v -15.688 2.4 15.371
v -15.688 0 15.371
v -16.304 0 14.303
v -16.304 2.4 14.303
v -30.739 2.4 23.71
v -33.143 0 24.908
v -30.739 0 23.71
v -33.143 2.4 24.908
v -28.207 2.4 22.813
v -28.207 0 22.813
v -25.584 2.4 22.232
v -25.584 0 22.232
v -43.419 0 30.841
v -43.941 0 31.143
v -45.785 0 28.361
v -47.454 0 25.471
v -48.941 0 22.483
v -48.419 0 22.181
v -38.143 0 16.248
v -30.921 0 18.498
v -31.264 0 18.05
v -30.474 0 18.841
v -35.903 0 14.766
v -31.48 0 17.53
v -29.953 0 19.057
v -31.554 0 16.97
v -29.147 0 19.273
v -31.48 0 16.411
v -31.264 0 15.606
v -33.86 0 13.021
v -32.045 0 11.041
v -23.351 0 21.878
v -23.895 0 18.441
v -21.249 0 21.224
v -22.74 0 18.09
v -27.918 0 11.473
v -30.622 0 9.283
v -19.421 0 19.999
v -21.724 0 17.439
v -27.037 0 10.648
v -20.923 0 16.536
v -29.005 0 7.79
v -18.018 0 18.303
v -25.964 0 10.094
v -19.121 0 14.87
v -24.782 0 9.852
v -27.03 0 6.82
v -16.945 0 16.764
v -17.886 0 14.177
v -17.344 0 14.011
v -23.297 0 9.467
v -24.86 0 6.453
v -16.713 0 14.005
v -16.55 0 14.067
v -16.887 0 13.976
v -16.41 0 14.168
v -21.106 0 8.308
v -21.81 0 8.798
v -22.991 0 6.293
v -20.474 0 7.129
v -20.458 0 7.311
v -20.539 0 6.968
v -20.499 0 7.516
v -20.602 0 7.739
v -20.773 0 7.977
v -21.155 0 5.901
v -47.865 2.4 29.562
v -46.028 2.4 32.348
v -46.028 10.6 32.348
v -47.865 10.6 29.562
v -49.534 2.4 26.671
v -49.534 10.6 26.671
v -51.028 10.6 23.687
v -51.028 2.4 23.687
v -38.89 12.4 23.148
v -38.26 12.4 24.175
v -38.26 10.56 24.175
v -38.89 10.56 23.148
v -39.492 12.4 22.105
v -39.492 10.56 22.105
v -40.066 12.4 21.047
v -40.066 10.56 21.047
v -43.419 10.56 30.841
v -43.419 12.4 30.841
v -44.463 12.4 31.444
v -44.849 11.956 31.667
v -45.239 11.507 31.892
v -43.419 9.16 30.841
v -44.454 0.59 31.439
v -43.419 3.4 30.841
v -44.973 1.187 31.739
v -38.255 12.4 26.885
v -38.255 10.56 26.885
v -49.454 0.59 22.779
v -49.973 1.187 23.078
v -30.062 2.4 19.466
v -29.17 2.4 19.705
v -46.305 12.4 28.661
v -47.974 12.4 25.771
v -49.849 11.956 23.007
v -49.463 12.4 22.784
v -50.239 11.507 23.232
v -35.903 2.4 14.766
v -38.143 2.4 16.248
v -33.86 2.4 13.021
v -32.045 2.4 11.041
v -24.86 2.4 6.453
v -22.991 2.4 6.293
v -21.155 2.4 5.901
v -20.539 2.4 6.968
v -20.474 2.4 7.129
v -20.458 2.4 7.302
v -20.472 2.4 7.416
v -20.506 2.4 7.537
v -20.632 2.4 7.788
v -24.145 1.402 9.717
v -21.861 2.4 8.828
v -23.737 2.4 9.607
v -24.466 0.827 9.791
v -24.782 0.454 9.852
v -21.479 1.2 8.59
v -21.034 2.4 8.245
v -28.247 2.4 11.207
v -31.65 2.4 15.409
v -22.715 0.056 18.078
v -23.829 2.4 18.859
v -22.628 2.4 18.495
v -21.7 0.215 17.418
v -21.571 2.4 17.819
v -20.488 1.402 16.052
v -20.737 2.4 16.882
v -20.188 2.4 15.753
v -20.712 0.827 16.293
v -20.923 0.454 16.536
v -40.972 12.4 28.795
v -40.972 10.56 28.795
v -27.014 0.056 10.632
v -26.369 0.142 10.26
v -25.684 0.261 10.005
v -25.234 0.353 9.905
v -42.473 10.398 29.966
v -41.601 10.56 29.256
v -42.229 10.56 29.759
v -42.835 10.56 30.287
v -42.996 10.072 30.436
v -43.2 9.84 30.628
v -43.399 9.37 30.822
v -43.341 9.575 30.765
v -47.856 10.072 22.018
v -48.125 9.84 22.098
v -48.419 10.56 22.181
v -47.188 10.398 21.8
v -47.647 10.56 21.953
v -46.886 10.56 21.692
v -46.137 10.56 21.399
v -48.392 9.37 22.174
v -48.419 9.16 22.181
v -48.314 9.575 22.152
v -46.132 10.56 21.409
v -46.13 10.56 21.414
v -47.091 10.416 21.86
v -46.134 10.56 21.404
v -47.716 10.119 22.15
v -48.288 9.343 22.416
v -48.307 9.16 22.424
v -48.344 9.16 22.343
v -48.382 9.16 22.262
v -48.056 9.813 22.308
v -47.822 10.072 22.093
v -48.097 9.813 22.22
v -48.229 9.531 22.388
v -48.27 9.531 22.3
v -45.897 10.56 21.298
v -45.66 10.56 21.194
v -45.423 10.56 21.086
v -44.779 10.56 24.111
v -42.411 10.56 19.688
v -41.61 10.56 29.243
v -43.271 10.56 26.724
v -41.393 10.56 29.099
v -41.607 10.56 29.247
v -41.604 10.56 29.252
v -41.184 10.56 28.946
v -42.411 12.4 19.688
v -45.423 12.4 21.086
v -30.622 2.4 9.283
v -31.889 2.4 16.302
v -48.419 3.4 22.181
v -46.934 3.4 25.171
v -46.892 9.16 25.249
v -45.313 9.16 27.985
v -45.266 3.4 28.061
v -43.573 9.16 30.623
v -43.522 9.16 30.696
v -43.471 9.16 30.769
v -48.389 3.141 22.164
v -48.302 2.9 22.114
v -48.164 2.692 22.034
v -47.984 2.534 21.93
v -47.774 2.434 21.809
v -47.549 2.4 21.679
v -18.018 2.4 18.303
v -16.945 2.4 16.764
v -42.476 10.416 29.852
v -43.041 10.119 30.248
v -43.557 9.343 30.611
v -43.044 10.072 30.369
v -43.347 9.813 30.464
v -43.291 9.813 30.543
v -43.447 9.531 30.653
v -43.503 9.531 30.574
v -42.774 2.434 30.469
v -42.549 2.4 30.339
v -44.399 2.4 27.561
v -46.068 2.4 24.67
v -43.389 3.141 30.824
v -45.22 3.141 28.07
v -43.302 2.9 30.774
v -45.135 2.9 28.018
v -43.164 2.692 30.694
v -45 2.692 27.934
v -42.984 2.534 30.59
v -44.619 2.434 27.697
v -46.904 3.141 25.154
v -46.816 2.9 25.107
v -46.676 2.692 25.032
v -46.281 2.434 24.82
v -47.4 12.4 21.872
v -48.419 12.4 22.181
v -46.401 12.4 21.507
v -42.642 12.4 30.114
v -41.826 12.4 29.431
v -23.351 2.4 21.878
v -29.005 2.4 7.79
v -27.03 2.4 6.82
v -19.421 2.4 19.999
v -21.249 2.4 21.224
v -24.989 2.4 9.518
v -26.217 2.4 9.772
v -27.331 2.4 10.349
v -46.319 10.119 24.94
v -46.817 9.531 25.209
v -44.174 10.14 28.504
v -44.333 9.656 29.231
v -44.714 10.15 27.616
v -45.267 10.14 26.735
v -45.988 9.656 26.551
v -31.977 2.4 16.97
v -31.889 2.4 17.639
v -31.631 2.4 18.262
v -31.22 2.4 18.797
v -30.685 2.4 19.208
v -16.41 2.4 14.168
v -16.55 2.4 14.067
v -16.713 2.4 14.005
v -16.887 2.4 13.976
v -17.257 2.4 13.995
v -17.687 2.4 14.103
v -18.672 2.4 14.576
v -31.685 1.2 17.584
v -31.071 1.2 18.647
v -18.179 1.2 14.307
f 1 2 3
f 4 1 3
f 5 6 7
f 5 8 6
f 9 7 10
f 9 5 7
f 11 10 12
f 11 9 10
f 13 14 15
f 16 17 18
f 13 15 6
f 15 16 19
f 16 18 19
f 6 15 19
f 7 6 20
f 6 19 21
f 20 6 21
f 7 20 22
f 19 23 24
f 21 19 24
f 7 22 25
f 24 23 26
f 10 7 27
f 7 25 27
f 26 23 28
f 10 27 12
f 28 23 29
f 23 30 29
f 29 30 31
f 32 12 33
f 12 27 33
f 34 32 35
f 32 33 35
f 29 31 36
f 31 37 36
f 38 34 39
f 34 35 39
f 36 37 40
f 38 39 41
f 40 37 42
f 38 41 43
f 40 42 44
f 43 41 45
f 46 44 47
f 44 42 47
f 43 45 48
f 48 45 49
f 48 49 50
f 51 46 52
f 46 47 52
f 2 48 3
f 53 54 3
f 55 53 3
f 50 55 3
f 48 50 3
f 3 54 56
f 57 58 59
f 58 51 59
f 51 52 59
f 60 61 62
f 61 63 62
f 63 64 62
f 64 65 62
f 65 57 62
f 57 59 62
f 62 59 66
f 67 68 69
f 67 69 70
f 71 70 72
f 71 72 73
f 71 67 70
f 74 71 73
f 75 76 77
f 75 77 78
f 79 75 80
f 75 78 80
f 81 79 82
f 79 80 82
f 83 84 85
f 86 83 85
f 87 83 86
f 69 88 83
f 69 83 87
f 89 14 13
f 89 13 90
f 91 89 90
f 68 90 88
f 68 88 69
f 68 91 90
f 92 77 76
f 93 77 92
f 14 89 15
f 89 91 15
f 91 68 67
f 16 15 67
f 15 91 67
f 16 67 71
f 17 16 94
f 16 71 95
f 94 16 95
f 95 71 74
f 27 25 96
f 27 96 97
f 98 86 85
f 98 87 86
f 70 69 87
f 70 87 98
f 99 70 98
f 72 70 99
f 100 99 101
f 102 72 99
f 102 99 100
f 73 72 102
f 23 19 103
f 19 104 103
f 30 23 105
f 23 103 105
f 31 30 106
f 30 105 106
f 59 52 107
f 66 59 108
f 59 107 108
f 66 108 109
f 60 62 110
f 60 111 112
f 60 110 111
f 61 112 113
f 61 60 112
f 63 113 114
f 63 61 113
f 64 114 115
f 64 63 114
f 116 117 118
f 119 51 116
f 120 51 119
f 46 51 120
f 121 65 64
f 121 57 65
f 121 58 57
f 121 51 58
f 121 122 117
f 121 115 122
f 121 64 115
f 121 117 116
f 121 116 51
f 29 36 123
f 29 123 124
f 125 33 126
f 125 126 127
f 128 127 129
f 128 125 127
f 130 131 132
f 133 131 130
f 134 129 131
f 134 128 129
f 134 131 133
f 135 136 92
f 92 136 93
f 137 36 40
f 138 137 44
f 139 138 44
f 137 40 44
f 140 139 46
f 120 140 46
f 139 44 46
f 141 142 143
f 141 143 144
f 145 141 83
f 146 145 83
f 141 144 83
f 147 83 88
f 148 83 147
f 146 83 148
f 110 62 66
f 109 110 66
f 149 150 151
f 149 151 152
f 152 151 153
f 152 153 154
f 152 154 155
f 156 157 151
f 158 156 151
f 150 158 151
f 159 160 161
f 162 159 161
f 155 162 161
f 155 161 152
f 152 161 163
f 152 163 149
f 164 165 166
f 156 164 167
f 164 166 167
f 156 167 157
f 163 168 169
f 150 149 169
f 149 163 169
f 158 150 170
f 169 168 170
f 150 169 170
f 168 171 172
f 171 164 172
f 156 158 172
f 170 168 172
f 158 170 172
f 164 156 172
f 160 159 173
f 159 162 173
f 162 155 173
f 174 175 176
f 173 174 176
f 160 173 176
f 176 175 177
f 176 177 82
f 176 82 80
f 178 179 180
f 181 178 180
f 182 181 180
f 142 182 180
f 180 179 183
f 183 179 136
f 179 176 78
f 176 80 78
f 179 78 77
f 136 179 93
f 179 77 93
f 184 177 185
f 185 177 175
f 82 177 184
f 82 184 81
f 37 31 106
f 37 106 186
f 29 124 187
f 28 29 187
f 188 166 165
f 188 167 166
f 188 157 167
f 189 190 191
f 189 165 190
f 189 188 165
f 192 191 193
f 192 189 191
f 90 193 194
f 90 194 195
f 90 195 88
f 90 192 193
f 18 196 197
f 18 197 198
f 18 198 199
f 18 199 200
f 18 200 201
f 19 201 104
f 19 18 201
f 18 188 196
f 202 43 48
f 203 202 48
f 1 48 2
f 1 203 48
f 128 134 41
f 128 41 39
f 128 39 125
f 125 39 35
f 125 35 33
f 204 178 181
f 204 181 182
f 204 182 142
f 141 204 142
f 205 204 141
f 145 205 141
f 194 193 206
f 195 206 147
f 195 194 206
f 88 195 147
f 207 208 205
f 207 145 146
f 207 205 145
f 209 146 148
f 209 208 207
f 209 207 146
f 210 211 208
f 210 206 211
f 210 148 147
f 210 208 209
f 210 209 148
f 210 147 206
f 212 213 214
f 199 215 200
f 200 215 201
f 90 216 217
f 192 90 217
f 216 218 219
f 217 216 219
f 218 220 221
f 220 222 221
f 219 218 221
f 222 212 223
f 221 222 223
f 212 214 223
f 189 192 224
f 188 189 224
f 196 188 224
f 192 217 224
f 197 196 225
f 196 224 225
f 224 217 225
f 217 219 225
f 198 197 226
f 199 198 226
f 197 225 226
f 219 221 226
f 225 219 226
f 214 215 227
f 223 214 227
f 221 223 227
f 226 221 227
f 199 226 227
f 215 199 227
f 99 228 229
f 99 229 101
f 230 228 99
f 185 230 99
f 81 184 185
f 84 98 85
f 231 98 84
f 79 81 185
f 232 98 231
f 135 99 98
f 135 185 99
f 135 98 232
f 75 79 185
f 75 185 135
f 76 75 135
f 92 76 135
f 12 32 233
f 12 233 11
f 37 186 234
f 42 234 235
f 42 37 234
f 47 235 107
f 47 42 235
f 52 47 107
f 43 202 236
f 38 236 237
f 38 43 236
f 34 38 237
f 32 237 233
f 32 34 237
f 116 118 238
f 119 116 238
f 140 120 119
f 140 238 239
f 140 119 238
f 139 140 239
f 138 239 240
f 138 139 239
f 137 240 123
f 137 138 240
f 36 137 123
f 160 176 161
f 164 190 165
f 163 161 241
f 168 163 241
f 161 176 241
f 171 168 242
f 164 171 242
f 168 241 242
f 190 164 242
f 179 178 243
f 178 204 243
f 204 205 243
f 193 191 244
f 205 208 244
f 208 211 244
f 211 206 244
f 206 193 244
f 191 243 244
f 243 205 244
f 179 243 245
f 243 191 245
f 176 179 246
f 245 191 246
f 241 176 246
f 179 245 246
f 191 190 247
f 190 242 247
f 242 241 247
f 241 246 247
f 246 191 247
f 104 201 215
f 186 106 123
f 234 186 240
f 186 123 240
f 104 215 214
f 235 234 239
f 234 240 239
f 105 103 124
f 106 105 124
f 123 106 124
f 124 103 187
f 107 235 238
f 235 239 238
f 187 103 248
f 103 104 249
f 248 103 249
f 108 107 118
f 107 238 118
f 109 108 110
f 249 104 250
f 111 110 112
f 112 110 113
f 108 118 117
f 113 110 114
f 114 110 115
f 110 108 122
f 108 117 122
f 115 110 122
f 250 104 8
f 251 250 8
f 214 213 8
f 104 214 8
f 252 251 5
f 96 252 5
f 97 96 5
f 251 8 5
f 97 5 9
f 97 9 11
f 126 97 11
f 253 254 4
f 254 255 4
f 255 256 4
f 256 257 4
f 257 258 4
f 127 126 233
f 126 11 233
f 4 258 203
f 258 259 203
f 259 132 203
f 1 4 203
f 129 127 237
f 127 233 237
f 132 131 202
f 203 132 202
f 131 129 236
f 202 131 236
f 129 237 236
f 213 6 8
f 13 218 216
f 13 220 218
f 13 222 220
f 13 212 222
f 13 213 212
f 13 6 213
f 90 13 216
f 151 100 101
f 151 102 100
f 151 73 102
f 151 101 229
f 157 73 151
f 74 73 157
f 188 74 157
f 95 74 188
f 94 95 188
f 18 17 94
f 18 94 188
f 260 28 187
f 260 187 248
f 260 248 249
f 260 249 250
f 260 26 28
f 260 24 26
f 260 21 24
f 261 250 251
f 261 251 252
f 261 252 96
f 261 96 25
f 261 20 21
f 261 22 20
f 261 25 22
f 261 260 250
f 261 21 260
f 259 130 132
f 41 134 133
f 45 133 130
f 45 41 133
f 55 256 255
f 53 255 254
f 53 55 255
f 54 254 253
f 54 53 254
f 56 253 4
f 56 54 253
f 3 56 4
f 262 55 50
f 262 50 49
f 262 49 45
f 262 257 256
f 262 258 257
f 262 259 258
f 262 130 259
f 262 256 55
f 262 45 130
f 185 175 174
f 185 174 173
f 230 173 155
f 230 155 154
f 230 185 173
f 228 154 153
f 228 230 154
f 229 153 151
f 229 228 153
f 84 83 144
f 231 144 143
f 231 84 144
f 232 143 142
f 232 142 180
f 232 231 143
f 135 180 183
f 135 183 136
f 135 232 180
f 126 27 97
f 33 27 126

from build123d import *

# Parameters (mm, degrees)
EXTRUDE_1_DEPTH     = 2.4
EXTRUDE_1_DRAFT     = 10
EXTRUDE_2_DEPTH     = 12.4
EXTRUDE_4_DEPTH     = 2.4
EXTRUDE_START       = -1.84
EXTRUDE_3_DEPTH     = 1.84
CHAMFER_1_SIZE      = 2.4
FILLET_3_R          = 1
FILLET_4_R          = 19
CHAMFER_2_SIZE      = 1.5
CHAMFER_3_SIZE      = 1.5
FILLET_5_SIZE       = 2.4
FILLET_5_SIZE_2     = 1.4
FILLET_8_R          = 15
CUT_EXTRUDE_2_DEPTH = 5
FILLET_6_DEPTH      = 3
FILLET_START        = -1
FILLET_7_DEPTH      = 4
CHAMFER_4_SIZE      = 1.8
FILLET_9_R          = 22


with BuildPart() as part:
    # 草图1 → 凸台-拉伸1 (with draft: the straight prism first)
    with BuildSketch(Plane(origin=(0, 0, 0), x_dir=(1, 0, 0), z_dir=(0, 1, 0))):
        with BuildLine():
            Line((-8, -10.392304845), (-13, -1.732050808))
            Line((-13, -1.732050808), (-21.967816979, -6.909622355))
            Line((-21.967816979, -6.909622355), (-22.707395472, -6.711455524))
            ThreePointArc((-22.707395472, -6.711455524), (-27.045667208, -6.825066474), (-30.622176838, -9.283132374))
            Line((-30.622176838, -9.283132374), (-34.43427487, -13.990668154))
            Line((-34.43427487, -13.990668154), (-34.611399325, -14.209398026))
            Line((-34.611399325, -14.209398026), (-48.418968561, -22.181201841))
            ThreePointArc((-48.418968561, -22.181201841), (-46.122680686, -26.62894211), (-43.418968561, -30.841455878))
            Line((-43.418968561, -30.841455878), (-29.611399325, -22.869652063))
            Line((-29.611399325, -22.869652063), (-29.333411472, -22.825622721))
            Line((-29.333411472, -22.825622721), (-23.350516885, -21.878016874))
            ThreePointArc((-23.350516885, -21.878016874), (-19.433514554, -20.009701627), (-17.165988715, -16.309453567))
            Line((-17.165988715, -16.309453567), (-16.967816979, -15.569876393))
            Line((-16.967816979, -15.569876393), (-8, -10.392304845))
        make_face()
        with BuildLine():
            Line((-27.917710858, -11.473169763), (-31.264303283, -15.605855609))
            Line((-31.264303283, -15.605855609), (-31.480162481, -16.411447438))
            ThreePointArc((-31.480162481, -16.411447438), (-31.264379417, -18.05049777), (-29.952811807, -19.056896659))
            Line((-29.952811807, -19.056896659), (-29.147219046, -19.27275307))
            Line((-29.147219046, -19.27275307), (-23.894912088, -18.440861966))
            ThreePointArc((-23.894912088, -18.440861966), (-21.762087, -17.423555776), (-20.527408298, -15.408754734))
            Line((-20.527408298, -15.408754734), (-19.958845574, -13.286877913))
            ThreePointArc((-19.958845574, -13.286877913), (-20.174626779, -11.647826039), (-21.486196869, -10.641428268))
            Line((-21.486196869, -10.641428268), (-23.608077089, -10.07287972))
            ThreePointArc((-23.608077089, -10.07287972), (-25.97028529, -10.134742248), (-27.917710858, -11.473169763))
        make_face(mode=Mode.SUBTRACT)
    extrude(amount=EXTRUDE_1_DEPTH)
    # 凸台-拉伸1: the draft: its side faces are tilted about the plane it starts from
    extrude_1_sides = [part.faces().sort_by_distance(p)[0] for p in [
        (-26.480958105, 1.2, 22.373834469),
        (-29.59100707, 1.2, 13.539512686),
        (-31.372232882, 1.2, 16.008651523),
        (-31.264379417, 1.2, 18.05049777),
        (-29.550015427, 1.2, 19.164824864),
        (-26.521065567, 1.2, 18.856807518),
        (-21.762087, 1.2, 17.423555776),
        (-20.243126936, 1.2, 14.347816323),
        (-20.174626779, 1.2, 11.647826039),
        (-22.547136979, 1.2, 10.357153994),
        (-25.97028529, 1.2, 10.134742248),
        (-46.122680686, 1.2, 26.62894211),
        (-41.515183943, 1.2, 18.195299933),
        (-32.616788082, 1.2, 11.7462652),
        (-27.045667208, 1.2, 6.825066474),
        (-22.337606226, 1.2, 6.810538939),
        (-17.48390849, 1.2, 4.320836581),
        (-10.5, 1.2, 6.062177826),
        (-12.48390849, 1.2, 12.981090619),
        (-17.066902847, 1.2, 15.93966498),
        (-36.515183943, 1.2, 26.855553971),
        (-19.433514554, 1.2, 20.009701627),
    ]]
    draft(extrude_1_sides, Plane(origin=(0, 0, 0), x_dir=(1, 0, 0), z_dir=(0, 1, 0)), EXTRUDE_1_DRAFT)



with BuildPart() as body_2:
    # 草图3 → 凸台-拉伸2 (new body)
    with BuildSketch(Plane.XZ):
        with BuildLine():
            Line((-43.418968561, 30.841455878), (-46.027952282, 32.347753332))
            ThreePointArc((-46.027952282, 32.347753332), (-48.720756898, 28.12894211), (-51.027952282, 23.687499294))
            Line((-51.027952282, 23.687499294), (-48.418968561, 22.181201841))
            ThreePointArc((-48.418968561, 22.181201841), (-46.122680686, 26.62894211), (-43.418968561, 30.841455878))
        make_face()
    extrude(amount=-EXTRUDE_2_DEPTH)


with BuildPart() as part_1:
    add(part.part)

    add(body_2.part)  # 凸台-拉伸4 merges body 2
    # 草图2 → 凸台-拉伸4 (add)
    with BuildSketch(Plane.XZ):
        with BuildLine():
            Line((-13, 1.732050808), (-8, 10.392304845))
            Line((-8, 10.392304845), (-16.967816979, 15.569876393))
            Line((-16.967816979, 15.569876393), (-17.165988715, 16.309453567))
            ThreePointArc((-17.165988715, 16.309453567), (-19.433514554, 20.009701627), (-23.350516885, 21.878016874))
            Line((-23.350516885, 21.878016874), (-29.611399325, 22.869652063))
            Line((-29.611399325, 22.869652063), (-43.418968561, 30.841455878))
            ThreePointArc((-43.418968561, 30.841455878), (-46.122680686, 26.62894211), (-48.418968561, 22.181201841))
            Line((-48.418968561, 22.181201841), (-34.611399325, 14.209398026))
            Line((-34.611399325, 14.209398026), (-30.622176838, 9.283132374))
            ThreePointArc((-30.622176838, 9.283132374), (-27.045667208, 6.825066474), (-22.707395472, 6.711455524))
            Line((-22.707395472, 6.711455524), (-21.967816979, 6.909622355))
            Line((-21.967816979, 6.909622355), (-13, 1.732050808))
        make_face()
        Polygon((-28.267922288, 9.695660603), (-32.994912051, 15.569876392), (-31.812956682, 19.594100966), (-26.346816011, 20.919608689), (-19.040272004, 17.121163853), (-18.489608424, 9.956624946), (-26.72941961, 8.295337377), align=None, mode=Mode.SUBTRACT)
    extrude(amount=-EXTRUDE_4_DEPTH)

    # 草图4 → 凸台-拉伸3 (add)
    with BuildSketch(Plane(origin=(0, 12.4, 0), x_dir=(1, 0, 0), z_dir=(0, 1, 0)).offset(EXTRUDE_START)):
        with BuildLine():
            Line((-41.050551196, -19.055926389), (-51.027952282, -23.687499294))
            ThreePointArc((-51.027952282, -23.687499294), (-48.720756898, -28.12894211), (-46.027952282, -32.347753332))
            Line((-46.027952282, -32.347753332), (-37.028191944, -26.02285698))
            ThreePointArc((-37.028191944, -26.02285698), (-39.194477456, -22.62894211), (-41.050551196, -19.055926389))
        make_face()
    extrude(amount=EXTRUDE_3_DEPTH)

    # 倒角1
    chamfer_1_edges = [part_1.edges().sort_by_distance(p)[0] for p in [
        (-48.720756898, 0, 28.12894211),
    ]]
    chamfer(chamfer_1_edges, length=CHAMFER_1_SIZE)

    # 圆角3
    fillet_3_edges = [part_1.edges().sort_by_distance(p)[0] for p in [
        (-46.122680686, 2.4, 26.62894211),
    ]]
    fillet(fillet_3_edges, radius=FILLET_3_R)

    # 圆角4
    # the kernel refuses this fillet: 19 mm, written as the material it adds along each edge
    with BuildSketch(Plane(origin=(-43.57347219, 12.4, 30.6227816), x_dir=(0.577045376166988, 0, 0.8167120874851181), z_dir=(0, -1, 0))) as fillet_4_piece_1:
        with BuildLine():
            CenterArc((19.007931444, -3.131386572), FILLET_4_R, 170.513813317, 9.63021169)
            Line((0.007991472, -3.179147023), (0, 0))
            ThreePointArc((0, 0), (0.133874766, 0.000168261), (0.267749531, 0))
        make_face()
    extrude(amount=1.84)
    with BuildSketch(Plane(origin=(-48.306842895, 12.4, 22.424343047), x_dir=(-0.4187707272566132, 0, -0.908091998639437), z_dir=(0, -1, 0))) as fillet_4_piece_2:
        with BuildLine():
            CenterArc((19.007931444, 3.131386572), FILLET_4_R, 179.855974993, 9.63021169)
            Line((0.007991472, 3.179147023), (0, 0))
            ThreePointArc((0, 0), (0.133874766, -0.000168261), (0.267749531, 0))
        make_face()
    extrude(amount=1.84)

    # 倒角2
    # the kernel refuses this chamfer: 2.14222201, 1.5 mm, written as the material it takes off along each edge
    with BuildSketch(Plane(origin=(-41.050551196, 4.828583957, 19.055926389), x_dir=(-0.9070364623462953, 0, 0.4210520822586176), z_dir=(0, 1, 0))) as chamfer_2_piece_1:
        with BuildLine():
            Line((CHAMFER_2_SIZE, 0), (-0.054482274, 2.220030761))
            ThreePointArc((-0.054482274, 2.220030761), (-0.014513006, 1.146056403), (0, 0))
            Line((0, 0), (CHAMFER_2_SIZE, 0))
        make_face()
    extrude(amount=13.302832086, mode=Mode.SUBTRACT)

    # 倒角3
    # the kernel refuses this chamfer: 2.14222201, 1.5 mm, written as the material it takes off along each edge
    with BuildSketch(Plane(origin=(-37.028191944, 4.828583957, 26.02285698), x_dir=(-0.5547448997341907, 0, -0.8320204902638533), z_dir=(0, 1, 0))) as chamfer_3_piece_1:
        with BuildLine():
            Line((2.220699191, 0), (-CHAMFER_3_SIZE * 0.0245338379121, CHAMFER_3_SIZE * 0.999699000098))
            Line((-CHAMFER_3_SIZE * 0.0245338379121, CHAMFER_3_SIZE * 0.999699000098), (0, 0))
            ThreePointArc((0, 0), (1.1460675, 0.013608524), (2.220699191, 0))
        make_face()
    extrude(amount=13.302832086, mode=Mode.SUBTRACT)

    # 圆角5
    # a fillet whose section is not a circle: 2.4, 1.4 mm, written as the material it adds along each edge
    with BuildSketch(Plane(origin=(0, 10.56, 0), x_dir=(-0.8181600307253523, 0, 0.5749905774214832), z_dir=(0.5749905774214832, 0, 0.8181600307253523))) as fillet_5_piece_1:
        with BuildLine():
            Bezier((53.25788422 - FILLET_5_SIZE, 0), (53.25788422, 0), (53.25788422, FILLET_5_SIZE_2), weights=[1, 0.707106781, 1])
            Line((53.25788422, FILLET_5_SIZE_2), (53.25788422, 0))
            Line((53.25788422, 0), (53.25788422 - FILLET_5_SIZE, 0))
        make_face()
    revolve(axis=Axis((0, 10.56, 0), (0, -1, 0)), revolution_arc=10.197944658)
    with BuildSketch(Plane(origin=(1.03e-07, 10.56, -7.3e-08), x_dir=(-0.8181600307218722, 0, 0.574990577426435), z_dir=(-0.574990577426435, 0, -0.8181600307218722))) as fillet_5_piece_2_section:
        with BuildLine():
            Bezier((53.257884346 - FILLET_5_SIZE, 0), (53.257884346, 0), (53.257884346, -FILLET_5_SIZE_2), weights=[1, 0.707106781, 1])
            Line((53.257884346, -FILLET_5_SIZE_2), (53.257884346, 0))
            Line((53.257884346, 0), (53.257884346 - FILLET_5_SIZE, 0))
        make_face()
    fillet_5_piece_2 = revolve(axis=Axis((1.03e-07, 10.56, -7.3e-08), (0, 1, 0)), revolution_arc=6.742956788, mode=Mode.PRIVATE)
    fillet_5_piece_2 = fillet_5_piece_2 - Plane(origin=(-30.047591975, 10.56, 44.339836826), x_dir=(0.5770453761670518, 0, 0.8167120874850732), z_dir=(0, 1, 0)) * Cylinder(19, 214, mode=Mode.PRIVATE)
    add(fillet_5_piece_2)
    with BuildSketch(Plane(origin=(1.14e-07, 10.56, -5.3e-08), x_dir=(-0.9070364623485727, 0, 0.4210520822537116), z_dir=(0.4210520822537116, 0, 0.9070364623485727))) as fillet_5_piece_3_section:
        with BuildLine():
            Bezier((53.257884346 - FILLET_5_SIZE, 0), (53.257884346, 0), (53.257884346, FILLET_5_SIZE_2), weights=[1, 0.707106781, 1])
            Line((53.257884346, FILLET_5_SIZE_2), (53.257884346, 0))
            Line((53.257884346, 0), (53.257884346 - FILLET_5_SIZE, 0))
        make_face()
    fillet_5_piece_3 = revolve(axis=Axis((1.14e-07, 10.56, -5.3e-08), (0, -1, 0)), revolution_arc=6.742956788, mode=Mode.PRIVATE)
    fillet_5_piece_3 = fillet_5_piece_3 - Plane(origin=(-53.423221079, 10.56, 3.85205956), x_dir=(-0.41877072725709835, 0, -0.9080919986392134), z_dir=(0, 1, 0)) * Cylinder(19, 214, mode=Mode.PRIVATE)
    add(fillet_5_piece_3)

    # 圆角8
    fillet_8_edges = [part_1.edges().sort_by_distance(p)[0] for p in [
        (-16.967816979, 1.2, 15.569876393),
        (-21.967816979, 1.2, 6.909622355),
    ]]
    fillet(fillet_8_edges, radius=FILLET_8_R)

    # 草图5 → 切除-拉伸2 (cut)
    with BuildSketch(Plane.XZ):
        with BuildLine():
            Line((-29.147219046, 19.27275307), (-31.264303283, 15.605855609))
            Line((-31.264303283, 15.605855609), (-27.917710858, 11.473169763))
            ThreePointArc((-27.917710858, 11.473169763), (-26.519580592, 10.33421548), (-24.781854923, 9.852245982))
            ThreePointArc((-24.781854923, 9.852245982), (-22.061802465, 9.586923289), (-19.411053684, 8.921632073))
            Line((-19.411053684, 8.921632073), (-21.155274081, 5.900553727))
            Line((-21.155274081, 5.900553727), (-15.208253994, -4.420406035))
            Line((-15.208253994, -4.420406035), (0.192169605, 10.177783302))
            Line((0.192169605, 10.177783302), (-15.687666464, 15.370727914))
            Line((-15.687666464, 15.370727914), (-17.431886861, 12.349649567))
            ThreePointArc((-17.431886861, 12.349649567), (-19.333420345, 14.312619743), (-20.923222766, 16.535592924))
            ThreePointArc((-20.923222766, 16.535592924), (-22.209483528, 17.799522767), (-23.894912088, 18.440861966))
            Line((-23.894912088, 18.440861966), (-29.147219046, 19.27275307))
        make_face()
    extrude(amount=-CUT_EXTRUDE_2_DEPTH, mode=Mode.SUBTRACT)

    # 圆角6: read off the stored shape, not the designer's step
    # 圆角6 outline → 圆角6 (cut)
    with BuildSketch(Plane(origin=(0, 0, 0), x_dir=(1, 0, 0), z_dir=(0, 1, 0))):
        with BuildLine():
            Line((-19.411053684, -8.921632073), (-20.538770468, -6.968369307))
            add(Edge.make_bspline(
                [(-20.538770468, -6.968369307), (-19.421581423, -8.903397494), (-24.781854923, -9.852245982)],
                knots=[0, 0, 0, 1, 1, 1], degree=2, weights=[1, 0.573849647, 1]))
            ThreePointArc((-24.781854923, -9.852245982), (-22.061802466, -9.586923289), (-19.411053684, -8.921632073))
        make_face()
    extrude(amount=FILLET_6_DEPTH, mode=Mode.SUBTRACT)

    # 圆角7: read off the stored shape, not the designer's step
    # 圆角7 outline → 圆角7 (cut)
    with BuildSketch(Plane(origin=(0, 0, 0), x_dir=(1, 0, 0), z_dir=(0, 1, 0)).offset(FILLET_START)):
        with BuildLine():
            ThreePointArc((-17.431886861, -12.349649567), (-19.333420346, -14.312619744), (-20.923222767, -16.535592926))
            add(Edge.make_bspline(
                [(-20.923222767, -16.535592926), (-17.421359117, -12.367884155), (-16.304170077, -14.302912333)],
                knots=[0, 0, 0, 1, 1, 1], degree=2, weights=[1, 0.573849648, 1]))
            Line((-16.304170077, -14.302912333), (-17.431886861, -12.349649567))
        make_face()
    extrude(amount=FILLET_7_DEPTH, mode=Mode.SUBTRACT)

    # 倒角4
    chamfer_4_edges = [part_1.edges().sort_by_distance(p)[0] for p in [
        (-48.720756898, 12.4, 28.12894211),
    ]]
    chamfer(chamfer_4_edges, length=CHAMFER_4_SIZE)

    # 圆角9
    fillet_9_edges = [part_1.edges().sort_by_distance(p)[0] for p in [
        (-34.611399325, 1.2, 14.209398026),
        (-29.611399325, 1.2, 22.869652063),
    ]]
    fillet(fillet_9_edges, radius=FILLET_9_R)


solid = part_1.part
